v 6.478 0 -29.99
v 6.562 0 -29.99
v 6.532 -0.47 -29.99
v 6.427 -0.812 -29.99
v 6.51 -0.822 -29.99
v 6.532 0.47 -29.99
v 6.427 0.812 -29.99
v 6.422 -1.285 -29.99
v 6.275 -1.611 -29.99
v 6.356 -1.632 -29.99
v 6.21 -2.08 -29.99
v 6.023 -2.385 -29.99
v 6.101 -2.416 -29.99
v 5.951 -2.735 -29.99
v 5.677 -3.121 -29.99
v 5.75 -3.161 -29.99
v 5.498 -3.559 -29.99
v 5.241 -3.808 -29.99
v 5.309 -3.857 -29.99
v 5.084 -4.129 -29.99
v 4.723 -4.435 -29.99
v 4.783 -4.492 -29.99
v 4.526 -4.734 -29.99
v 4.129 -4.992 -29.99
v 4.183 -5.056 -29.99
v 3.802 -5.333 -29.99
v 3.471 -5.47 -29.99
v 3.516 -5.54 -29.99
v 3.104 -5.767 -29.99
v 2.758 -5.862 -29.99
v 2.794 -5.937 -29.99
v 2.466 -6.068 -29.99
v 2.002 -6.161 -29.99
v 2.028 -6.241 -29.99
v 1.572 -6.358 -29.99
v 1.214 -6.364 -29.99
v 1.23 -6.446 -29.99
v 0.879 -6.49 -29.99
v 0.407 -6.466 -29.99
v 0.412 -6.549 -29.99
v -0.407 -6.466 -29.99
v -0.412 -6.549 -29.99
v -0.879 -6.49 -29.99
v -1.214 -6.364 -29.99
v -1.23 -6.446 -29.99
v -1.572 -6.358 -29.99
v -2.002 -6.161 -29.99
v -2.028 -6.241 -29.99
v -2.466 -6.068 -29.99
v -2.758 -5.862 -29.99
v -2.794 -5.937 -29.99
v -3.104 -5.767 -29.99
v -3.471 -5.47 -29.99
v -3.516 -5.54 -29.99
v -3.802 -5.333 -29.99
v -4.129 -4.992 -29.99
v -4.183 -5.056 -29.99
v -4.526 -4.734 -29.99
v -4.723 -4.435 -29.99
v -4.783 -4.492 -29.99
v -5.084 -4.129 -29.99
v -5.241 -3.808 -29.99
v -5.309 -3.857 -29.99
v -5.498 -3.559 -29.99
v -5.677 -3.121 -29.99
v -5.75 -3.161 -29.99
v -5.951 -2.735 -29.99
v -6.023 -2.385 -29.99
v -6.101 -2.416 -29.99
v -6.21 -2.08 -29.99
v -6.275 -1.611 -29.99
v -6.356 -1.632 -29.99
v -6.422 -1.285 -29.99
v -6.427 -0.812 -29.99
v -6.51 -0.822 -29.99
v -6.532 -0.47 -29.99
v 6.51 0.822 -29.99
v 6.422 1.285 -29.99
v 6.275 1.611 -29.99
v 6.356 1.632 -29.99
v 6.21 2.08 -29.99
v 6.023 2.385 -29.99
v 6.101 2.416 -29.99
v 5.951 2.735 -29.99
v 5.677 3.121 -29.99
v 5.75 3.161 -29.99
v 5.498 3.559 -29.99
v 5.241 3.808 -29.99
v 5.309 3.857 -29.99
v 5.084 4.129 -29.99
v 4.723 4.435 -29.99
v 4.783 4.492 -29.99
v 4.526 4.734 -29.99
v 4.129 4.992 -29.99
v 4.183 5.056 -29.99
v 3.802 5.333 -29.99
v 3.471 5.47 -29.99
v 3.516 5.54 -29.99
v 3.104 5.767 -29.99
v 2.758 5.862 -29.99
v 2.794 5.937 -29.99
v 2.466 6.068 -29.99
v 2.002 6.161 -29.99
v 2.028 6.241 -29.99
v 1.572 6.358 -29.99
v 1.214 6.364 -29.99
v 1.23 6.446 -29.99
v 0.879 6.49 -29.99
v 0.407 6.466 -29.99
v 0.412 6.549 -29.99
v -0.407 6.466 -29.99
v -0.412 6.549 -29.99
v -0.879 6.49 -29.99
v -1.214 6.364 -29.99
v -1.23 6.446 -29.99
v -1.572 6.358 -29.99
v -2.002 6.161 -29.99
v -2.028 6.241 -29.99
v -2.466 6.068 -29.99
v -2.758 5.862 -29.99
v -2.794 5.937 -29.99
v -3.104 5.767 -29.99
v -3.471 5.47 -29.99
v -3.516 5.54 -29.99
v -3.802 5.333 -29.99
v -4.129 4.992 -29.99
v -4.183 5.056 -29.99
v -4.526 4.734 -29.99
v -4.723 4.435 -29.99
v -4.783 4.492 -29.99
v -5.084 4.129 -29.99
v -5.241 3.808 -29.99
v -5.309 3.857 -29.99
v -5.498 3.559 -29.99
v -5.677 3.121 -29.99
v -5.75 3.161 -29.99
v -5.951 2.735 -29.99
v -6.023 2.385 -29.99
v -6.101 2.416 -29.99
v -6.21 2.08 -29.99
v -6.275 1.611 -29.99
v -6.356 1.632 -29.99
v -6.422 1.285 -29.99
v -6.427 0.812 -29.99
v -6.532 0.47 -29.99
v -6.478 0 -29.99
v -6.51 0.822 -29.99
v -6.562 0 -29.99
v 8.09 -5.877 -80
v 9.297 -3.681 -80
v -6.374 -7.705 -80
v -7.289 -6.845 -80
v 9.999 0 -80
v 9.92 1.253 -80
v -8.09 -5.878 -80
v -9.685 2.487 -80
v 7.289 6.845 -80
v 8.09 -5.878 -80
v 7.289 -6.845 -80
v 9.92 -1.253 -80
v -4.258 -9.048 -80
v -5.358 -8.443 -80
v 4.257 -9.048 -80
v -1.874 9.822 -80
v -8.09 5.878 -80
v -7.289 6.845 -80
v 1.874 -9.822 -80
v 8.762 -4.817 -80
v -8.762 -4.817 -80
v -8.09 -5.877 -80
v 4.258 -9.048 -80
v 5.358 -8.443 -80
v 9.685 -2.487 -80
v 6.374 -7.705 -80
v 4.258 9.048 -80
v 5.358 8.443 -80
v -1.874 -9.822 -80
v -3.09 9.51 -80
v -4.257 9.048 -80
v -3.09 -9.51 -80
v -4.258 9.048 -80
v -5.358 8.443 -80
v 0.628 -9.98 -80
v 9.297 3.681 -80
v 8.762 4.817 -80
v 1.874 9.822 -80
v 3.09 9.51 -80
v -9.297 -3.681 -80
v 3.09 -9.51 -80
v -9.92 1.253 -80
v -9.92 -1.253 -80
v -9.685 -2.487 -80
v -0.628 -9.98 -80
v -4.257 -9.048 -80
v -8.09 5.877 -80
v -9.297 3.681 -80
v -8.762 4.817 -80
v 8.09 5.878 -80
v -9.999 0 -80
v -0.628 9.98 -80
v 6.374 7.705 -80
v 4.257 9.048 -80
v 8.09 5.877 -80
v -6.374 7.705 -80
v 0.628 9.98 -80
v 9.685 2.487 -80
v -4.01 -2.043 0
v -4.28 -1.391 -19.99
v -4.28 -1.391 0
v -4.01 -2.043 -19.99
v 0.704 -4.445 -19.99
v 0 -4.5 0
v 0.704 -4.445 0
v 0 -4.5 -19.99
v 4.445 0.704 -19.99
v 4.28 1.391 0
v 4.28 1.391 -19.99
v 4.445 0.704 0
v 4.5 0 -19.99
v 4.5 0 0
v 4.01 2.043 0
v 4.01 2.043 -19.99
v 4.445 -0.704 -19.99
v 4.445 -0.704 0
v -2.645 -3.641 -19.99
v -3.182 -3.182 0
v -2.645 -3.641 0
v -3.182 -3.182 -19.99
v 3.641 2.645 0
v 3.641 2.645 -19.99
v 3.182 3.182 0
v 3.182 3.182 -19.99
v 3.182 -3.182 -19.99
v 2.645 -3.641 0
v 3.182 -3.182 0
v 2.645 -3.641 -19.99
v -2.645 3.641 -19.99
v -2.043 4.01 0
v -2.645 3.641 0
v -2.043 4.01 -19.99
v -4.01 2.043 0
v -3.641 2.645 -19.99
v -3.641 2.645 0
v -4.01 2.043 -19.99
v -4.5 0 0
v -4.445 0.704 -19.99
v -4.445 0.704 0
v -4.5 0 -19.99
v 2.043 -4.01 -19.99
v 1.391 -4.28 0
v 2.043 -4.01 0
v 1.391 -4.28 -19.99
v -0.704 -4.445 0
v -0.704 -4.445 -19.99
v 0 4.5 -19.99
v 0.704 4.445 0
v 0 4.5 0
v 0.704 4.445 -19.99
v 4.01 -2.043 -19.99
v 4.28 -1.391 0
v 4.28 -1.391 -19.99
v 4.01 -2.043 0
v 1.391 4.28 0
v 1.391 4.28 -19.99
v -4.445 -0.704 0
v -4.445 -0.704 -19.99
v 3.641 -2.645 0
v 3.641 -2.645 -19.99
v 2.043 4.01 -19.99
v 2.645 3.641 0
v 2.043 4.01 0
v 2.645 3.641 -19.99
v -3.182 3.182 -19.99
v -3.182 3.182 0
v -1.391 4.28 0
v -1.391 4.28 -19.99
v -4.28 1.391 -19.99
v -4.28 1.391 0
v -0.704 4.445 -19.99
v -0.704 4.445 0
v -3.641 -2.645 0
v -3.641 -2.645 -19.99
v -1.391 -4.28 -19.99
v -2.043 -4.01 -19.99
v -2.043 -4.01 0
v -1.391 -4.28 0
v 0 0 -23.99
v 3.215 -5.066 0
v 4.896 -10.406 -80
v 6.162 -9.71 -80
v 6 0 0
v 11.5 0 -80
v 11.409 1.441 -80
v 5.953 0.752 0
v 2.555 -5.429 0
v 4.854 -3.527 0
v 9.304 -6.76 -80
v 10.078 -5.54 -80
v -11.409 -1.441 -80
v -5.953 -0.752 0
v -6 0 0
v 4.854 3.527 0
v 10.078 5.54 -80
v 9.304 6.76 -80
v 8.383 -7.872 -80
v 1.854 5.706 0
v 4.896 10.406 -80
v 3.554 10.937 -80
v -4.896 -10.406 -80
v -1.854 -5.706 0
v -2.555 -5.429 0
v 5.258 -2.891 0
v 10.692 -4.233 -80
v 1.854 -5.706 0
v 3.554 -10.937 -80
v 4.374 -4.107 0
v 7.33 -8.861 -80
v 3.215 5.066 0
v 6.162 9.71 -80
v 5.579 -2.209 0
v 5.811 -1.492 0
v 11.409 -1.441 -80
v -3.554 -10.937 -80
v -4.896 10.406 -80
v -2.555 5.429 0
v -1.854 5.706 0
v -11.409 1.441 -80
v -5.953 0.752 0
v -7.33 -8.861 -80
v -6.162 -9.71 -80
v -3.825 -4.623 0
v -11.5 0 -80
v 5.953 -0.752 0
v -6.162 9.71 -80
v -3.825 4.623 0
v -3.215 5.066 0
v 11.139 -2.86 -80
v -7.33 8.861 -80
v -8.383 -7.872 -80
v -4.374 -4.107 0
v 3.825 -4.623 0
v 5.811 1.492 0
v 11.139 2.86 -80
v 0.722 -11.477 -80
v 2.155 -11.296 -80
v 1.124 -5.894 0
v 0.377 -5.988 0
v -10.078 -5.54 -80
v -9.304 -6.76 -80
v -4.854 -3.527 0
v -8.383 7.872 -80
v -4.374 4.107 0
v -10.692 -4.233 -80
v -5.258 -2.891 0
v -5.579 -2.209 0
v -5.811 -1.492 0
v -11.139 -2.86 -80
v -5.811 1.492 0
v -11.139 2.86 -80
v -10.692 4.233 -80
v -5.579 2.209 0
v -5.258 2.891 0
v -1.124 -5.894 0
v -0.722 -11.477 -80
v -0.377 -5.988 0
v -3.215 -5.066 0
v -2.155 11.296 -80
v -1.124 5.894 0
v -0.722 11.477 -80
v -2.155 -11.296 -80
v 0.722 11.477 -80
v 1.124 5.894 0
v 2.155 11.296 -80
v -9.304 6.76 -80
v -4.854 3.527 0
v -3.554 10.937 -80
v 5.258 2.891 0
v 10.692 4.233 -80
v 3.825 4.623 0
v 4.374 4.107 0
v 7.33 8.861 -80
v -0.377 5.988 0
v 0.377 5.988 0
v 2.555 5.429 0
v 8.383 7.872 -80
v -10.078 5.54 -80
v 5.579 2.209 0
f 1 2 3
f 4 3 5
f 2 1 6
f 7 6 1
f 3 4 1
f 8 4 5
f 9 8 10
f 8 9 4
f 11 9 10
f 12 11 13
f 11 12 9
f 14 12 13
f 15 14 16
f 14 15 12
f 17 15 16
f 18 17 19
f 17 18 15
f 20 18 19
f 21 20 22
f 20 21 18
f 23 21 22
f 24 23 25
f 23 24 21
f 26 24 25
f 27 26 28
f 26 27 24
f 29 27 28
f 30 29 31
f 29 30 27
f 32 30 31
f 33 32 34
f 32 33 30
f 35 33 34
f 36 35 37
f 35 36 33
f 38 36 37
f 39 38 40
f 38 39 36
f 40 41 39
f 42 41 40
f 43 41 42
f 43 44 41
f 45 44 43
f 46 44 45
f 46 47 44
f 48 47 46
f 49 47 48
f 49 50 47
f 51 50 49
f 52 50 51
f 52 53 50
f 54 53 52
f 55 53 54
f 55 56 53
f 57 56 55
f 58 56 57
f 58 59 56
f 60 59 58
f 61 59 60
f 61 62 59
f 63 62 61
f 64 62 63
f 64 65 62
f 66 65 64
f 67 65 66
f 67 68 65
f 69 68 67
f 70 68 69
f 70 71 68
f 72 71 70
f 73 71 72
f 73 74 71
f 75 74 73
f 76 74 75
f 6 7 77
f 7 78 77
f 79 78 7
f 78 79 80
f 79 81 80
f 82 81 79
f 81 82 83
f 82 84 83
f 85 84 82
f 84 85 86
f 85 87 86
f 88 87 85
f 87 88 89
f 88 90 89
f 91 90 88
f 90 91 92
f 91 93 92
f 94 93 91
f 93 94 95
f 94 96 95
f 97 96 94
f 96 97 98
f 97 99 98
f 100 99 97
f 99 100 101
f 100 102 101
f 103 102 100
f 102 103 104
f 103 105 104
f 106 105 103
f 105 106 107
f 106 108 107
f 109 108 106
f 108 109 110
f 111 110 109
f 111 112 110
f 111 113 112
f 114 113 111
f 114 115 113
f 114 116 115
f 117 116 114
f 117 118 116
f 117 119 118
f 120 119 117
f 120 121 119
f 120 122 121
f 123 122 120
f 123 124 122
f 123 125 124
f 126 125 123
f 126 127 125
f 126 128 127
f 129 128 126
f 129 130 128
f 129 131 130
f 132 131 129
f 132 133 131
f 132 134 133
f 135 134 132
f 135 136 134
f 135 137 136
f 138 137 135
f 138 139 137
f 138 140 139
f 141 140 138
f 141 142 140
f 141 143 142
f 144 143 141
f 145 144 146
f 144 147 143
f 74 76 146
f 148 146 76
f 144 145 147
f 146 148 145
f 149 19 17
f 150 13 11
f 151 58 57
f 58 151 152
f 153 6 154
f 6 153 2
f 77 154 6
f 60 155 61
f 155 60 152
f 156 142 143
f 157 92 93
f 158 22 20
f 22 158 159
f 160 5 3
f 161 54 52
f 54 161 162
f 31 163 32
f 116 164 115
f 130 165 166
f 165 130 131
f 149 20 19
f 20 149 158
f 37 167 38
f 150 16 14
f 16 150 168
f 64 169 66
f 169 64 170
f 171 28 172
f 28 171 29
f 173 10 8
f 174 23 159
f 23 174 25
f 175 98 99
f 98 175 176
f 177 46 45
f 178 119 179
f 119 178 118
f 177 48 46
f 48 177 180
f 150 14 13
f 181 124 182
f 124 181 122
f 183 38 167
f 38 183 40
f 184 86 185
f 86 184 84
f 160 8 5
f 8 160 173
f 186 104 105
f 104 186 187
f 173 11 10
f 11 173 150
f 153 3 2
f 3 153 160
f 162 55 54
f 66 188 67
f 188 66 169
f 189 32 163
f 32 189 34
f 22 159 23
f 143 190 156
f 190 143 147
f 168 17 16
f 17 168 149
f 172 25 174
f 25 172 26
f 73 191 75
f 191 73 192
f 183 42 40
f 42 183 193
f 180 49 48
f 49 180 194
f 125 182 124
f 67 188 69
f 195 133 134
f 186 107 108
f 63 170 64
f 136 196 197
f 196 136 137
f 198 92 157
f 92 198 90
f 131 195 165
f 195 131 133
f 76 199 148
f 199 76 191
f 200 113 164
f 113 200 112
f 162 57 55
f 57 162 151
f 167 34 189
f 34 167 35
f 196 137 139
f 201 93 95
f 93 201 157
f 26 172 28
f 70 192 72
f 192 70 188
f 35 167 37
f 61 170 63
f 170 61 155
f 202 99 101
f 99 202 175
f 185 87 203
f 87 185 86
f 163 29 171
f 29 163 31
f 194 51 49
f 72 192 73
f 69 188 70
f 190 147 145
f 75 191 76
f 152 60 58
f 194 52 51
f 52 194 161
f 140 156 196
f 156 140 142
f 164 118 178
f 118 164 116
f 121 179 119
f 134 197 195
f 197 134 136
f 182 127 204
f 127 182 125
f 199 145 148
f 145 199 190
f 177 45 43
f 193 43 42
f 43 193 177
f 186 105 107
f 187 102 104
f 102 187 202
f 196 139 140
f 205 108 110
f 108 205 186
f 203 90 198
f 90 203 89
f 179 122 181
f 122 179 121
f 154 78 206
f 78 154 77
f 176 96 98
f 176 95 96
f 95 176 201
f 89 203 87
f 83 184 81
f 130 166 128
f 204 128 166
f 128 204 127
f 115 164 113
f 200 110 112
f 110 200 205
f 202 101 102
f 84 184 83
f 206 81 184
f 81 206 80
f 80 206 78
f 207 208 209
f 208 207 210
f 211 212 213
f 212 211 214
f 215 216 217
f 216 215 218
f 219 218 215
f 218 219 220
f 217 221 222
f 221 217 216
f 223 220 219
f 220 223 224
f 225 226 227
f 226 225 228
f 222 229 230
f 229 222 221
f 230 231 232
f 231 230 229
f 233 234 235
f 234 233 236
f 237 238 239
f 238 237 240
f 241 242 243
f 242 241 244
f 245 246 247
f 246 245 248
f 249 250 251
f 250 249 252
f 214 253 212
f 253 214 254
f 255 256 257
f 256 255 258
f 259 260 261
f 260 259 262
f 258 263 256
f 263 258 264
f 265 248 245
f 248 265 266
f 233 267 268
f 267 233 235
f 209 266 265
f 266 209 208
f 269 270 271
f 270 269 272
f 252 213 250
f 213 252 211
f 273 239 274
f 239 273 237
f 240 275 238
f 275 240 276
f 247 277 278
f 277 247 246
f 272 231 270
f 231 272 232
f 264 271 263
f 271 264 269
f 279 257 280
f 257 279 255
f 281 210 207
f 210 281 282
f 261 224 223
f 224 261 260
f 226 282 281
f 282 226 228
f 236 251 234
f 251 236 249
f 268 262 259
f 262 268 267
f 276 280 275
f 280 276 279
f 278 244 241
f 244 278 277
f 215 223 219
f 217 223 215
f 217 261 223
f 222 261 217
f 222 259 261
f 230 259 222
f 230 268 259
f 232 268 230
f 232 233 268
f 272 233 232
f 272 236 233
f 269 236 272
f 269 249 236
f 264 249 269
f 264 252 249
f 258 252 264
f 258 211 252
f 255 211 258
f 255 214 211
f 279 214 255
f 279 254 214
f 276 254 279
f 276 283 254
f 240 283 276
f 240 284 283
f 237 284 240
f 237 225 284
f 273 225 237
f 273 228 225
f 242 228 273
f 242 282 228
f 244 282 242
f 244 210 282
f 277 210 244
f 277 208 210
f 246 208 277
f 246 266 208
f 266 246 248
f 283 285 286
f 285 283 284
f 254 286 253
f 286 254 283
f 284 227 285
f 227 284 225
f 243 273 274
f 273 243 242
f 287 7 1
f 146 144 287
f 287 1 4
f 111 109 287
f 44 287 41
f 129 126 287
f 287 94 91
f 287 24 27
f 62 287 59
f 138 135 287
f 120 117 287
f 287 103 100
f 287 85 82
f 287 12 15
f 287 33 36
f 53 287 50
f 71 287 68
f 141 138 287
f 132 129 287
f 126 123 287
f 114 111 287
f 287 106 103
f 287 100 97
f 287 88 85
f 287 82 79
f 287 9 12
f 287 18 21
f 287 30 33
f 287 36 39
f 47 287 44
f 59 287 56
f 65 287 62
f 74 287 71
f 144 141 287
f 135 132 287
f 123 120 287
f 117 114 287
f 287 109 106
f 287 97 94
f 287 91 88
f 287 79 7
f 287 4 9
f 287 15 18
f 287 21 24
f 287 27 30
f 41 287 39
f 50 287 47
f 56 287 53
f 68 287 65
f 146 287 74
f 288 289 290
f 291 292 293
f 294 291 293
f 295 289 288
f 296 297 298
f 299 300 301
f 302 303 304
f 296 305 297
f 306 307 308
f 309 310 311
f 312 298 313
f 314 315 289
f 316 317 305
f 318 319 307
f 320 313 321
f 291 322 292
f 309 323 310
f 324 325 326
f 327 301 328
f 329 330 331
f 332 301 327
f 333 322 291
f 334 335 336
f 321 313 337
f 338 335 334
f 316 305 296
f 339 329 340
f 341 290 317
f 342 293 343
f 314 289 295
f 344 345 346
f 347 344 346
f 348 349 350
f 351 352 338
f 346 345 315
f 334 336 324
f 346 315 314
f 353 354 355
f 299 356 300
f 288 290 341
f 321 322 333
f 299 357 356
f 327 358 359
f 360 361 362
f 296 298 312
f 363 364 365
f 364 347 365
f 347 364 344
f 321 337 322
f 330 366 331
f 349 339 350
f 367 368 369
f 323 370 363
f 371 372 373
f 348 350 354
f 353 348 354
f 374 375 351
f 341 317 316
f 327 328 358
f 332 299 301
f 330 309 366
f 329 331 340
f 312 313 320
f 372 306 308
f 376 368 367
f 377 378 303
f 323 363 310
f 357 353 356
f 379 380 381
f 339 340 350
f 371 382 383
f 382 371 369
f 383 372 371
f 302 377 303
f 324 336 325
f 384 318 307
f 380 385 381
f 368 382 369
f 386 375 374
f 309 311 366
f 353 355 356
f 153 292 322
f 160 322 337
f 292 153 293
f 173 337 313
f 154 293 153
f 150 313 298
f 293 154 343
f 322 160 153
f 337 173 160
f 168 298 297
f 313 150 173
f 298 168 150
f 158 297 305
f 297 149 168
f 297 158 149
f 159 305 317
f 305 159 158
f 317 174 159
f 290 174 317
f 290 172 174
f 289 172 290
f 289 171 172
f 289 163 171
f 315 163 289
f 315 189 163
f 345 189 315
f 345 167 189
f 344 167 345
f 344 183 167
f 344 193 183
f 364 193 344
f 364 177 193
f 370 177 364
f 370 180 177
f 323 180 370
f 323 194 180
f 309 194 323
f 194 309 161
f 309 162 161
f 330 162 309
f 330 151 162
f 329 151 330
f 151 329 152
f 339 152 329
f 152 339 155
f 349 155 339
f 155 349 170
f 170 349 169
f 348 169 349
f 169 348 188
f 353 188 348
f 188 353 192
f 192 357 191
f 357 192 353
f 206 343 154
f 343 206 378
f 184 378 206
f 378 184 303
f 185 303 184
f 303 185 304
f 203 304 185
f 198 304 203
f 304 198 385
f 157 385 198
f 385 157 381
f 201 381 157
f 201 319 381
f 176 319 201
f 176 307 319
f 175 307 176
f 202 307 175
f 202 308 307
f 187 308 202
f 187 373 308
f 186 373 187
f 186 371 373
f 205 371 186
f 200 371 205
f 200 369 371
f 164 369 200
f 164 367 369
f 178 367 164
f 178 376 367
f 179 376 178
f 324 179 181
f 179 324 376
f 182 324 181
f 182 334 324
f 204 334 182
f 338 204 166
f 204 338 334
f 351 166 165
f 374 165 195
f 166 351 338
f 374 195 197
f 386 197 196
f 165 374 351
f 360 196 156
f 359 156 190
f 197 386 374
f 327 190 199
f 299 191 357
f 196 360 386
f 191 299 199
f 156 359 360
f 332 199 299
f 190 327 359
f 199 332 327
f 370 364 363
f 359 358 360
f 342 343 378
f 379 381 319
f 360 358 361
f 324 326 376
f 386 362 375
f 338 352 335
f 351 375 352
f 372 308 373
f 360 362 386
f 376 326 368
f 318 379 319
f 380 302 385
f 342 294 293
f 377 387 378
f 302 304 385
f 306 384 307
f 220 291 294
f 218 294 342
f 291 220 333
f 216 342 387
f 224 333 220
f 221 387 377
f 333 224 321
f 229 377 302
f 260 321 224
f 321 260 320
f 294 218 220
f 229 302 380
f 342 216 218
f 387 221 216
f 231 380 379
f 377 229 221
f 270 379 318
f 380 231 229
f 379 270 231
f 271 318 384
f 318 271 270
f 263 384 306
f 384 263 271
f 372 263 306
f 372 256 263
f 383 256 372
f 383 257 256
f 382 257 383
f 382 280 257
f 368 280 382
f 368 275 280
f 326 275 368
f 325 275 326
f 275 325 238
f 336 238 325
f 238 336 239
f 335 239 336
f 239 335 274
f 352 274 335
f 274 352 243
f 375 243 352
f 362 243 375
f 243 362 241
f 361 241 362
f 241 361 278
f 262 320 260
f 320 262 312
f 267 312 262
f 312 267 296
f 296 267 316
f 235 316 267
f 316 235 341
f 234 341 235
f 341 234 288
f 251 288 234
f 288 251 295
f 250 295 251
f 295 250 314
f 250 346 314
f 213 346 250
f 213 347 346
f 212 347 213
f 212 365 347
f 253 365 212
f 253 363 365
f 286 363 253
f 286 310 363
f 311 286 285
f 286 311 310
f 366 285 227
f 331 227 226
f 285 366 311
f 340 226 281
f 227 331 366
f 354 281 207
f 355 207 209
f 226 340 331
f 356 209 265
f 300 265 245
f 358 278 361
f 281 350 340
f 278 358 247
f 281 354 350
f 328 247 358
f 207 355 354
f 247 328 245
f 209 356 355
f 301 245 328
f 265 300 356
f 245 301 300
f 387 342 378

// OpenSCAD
mirror([0,0,1]) difference() {
  cylinder(d1=12,d2=23,h=80,$fn=50);
  translate([0,0,-.01])
  {
    cylinder(d=9,h=20,$fn=40);
    translate([0,0,24]) cylinder(d1=0,d2=13,h=6.02,$fn=50);
    translate([0,0,24]) intersection() {
      translate([0,0,6]) cylinder(d=20,h=80.02,$fn=50);
      translate([0,0,-24]) cylinder(d1=9,d2=20,h=80.02,$fn=50);
    }
  }
}
